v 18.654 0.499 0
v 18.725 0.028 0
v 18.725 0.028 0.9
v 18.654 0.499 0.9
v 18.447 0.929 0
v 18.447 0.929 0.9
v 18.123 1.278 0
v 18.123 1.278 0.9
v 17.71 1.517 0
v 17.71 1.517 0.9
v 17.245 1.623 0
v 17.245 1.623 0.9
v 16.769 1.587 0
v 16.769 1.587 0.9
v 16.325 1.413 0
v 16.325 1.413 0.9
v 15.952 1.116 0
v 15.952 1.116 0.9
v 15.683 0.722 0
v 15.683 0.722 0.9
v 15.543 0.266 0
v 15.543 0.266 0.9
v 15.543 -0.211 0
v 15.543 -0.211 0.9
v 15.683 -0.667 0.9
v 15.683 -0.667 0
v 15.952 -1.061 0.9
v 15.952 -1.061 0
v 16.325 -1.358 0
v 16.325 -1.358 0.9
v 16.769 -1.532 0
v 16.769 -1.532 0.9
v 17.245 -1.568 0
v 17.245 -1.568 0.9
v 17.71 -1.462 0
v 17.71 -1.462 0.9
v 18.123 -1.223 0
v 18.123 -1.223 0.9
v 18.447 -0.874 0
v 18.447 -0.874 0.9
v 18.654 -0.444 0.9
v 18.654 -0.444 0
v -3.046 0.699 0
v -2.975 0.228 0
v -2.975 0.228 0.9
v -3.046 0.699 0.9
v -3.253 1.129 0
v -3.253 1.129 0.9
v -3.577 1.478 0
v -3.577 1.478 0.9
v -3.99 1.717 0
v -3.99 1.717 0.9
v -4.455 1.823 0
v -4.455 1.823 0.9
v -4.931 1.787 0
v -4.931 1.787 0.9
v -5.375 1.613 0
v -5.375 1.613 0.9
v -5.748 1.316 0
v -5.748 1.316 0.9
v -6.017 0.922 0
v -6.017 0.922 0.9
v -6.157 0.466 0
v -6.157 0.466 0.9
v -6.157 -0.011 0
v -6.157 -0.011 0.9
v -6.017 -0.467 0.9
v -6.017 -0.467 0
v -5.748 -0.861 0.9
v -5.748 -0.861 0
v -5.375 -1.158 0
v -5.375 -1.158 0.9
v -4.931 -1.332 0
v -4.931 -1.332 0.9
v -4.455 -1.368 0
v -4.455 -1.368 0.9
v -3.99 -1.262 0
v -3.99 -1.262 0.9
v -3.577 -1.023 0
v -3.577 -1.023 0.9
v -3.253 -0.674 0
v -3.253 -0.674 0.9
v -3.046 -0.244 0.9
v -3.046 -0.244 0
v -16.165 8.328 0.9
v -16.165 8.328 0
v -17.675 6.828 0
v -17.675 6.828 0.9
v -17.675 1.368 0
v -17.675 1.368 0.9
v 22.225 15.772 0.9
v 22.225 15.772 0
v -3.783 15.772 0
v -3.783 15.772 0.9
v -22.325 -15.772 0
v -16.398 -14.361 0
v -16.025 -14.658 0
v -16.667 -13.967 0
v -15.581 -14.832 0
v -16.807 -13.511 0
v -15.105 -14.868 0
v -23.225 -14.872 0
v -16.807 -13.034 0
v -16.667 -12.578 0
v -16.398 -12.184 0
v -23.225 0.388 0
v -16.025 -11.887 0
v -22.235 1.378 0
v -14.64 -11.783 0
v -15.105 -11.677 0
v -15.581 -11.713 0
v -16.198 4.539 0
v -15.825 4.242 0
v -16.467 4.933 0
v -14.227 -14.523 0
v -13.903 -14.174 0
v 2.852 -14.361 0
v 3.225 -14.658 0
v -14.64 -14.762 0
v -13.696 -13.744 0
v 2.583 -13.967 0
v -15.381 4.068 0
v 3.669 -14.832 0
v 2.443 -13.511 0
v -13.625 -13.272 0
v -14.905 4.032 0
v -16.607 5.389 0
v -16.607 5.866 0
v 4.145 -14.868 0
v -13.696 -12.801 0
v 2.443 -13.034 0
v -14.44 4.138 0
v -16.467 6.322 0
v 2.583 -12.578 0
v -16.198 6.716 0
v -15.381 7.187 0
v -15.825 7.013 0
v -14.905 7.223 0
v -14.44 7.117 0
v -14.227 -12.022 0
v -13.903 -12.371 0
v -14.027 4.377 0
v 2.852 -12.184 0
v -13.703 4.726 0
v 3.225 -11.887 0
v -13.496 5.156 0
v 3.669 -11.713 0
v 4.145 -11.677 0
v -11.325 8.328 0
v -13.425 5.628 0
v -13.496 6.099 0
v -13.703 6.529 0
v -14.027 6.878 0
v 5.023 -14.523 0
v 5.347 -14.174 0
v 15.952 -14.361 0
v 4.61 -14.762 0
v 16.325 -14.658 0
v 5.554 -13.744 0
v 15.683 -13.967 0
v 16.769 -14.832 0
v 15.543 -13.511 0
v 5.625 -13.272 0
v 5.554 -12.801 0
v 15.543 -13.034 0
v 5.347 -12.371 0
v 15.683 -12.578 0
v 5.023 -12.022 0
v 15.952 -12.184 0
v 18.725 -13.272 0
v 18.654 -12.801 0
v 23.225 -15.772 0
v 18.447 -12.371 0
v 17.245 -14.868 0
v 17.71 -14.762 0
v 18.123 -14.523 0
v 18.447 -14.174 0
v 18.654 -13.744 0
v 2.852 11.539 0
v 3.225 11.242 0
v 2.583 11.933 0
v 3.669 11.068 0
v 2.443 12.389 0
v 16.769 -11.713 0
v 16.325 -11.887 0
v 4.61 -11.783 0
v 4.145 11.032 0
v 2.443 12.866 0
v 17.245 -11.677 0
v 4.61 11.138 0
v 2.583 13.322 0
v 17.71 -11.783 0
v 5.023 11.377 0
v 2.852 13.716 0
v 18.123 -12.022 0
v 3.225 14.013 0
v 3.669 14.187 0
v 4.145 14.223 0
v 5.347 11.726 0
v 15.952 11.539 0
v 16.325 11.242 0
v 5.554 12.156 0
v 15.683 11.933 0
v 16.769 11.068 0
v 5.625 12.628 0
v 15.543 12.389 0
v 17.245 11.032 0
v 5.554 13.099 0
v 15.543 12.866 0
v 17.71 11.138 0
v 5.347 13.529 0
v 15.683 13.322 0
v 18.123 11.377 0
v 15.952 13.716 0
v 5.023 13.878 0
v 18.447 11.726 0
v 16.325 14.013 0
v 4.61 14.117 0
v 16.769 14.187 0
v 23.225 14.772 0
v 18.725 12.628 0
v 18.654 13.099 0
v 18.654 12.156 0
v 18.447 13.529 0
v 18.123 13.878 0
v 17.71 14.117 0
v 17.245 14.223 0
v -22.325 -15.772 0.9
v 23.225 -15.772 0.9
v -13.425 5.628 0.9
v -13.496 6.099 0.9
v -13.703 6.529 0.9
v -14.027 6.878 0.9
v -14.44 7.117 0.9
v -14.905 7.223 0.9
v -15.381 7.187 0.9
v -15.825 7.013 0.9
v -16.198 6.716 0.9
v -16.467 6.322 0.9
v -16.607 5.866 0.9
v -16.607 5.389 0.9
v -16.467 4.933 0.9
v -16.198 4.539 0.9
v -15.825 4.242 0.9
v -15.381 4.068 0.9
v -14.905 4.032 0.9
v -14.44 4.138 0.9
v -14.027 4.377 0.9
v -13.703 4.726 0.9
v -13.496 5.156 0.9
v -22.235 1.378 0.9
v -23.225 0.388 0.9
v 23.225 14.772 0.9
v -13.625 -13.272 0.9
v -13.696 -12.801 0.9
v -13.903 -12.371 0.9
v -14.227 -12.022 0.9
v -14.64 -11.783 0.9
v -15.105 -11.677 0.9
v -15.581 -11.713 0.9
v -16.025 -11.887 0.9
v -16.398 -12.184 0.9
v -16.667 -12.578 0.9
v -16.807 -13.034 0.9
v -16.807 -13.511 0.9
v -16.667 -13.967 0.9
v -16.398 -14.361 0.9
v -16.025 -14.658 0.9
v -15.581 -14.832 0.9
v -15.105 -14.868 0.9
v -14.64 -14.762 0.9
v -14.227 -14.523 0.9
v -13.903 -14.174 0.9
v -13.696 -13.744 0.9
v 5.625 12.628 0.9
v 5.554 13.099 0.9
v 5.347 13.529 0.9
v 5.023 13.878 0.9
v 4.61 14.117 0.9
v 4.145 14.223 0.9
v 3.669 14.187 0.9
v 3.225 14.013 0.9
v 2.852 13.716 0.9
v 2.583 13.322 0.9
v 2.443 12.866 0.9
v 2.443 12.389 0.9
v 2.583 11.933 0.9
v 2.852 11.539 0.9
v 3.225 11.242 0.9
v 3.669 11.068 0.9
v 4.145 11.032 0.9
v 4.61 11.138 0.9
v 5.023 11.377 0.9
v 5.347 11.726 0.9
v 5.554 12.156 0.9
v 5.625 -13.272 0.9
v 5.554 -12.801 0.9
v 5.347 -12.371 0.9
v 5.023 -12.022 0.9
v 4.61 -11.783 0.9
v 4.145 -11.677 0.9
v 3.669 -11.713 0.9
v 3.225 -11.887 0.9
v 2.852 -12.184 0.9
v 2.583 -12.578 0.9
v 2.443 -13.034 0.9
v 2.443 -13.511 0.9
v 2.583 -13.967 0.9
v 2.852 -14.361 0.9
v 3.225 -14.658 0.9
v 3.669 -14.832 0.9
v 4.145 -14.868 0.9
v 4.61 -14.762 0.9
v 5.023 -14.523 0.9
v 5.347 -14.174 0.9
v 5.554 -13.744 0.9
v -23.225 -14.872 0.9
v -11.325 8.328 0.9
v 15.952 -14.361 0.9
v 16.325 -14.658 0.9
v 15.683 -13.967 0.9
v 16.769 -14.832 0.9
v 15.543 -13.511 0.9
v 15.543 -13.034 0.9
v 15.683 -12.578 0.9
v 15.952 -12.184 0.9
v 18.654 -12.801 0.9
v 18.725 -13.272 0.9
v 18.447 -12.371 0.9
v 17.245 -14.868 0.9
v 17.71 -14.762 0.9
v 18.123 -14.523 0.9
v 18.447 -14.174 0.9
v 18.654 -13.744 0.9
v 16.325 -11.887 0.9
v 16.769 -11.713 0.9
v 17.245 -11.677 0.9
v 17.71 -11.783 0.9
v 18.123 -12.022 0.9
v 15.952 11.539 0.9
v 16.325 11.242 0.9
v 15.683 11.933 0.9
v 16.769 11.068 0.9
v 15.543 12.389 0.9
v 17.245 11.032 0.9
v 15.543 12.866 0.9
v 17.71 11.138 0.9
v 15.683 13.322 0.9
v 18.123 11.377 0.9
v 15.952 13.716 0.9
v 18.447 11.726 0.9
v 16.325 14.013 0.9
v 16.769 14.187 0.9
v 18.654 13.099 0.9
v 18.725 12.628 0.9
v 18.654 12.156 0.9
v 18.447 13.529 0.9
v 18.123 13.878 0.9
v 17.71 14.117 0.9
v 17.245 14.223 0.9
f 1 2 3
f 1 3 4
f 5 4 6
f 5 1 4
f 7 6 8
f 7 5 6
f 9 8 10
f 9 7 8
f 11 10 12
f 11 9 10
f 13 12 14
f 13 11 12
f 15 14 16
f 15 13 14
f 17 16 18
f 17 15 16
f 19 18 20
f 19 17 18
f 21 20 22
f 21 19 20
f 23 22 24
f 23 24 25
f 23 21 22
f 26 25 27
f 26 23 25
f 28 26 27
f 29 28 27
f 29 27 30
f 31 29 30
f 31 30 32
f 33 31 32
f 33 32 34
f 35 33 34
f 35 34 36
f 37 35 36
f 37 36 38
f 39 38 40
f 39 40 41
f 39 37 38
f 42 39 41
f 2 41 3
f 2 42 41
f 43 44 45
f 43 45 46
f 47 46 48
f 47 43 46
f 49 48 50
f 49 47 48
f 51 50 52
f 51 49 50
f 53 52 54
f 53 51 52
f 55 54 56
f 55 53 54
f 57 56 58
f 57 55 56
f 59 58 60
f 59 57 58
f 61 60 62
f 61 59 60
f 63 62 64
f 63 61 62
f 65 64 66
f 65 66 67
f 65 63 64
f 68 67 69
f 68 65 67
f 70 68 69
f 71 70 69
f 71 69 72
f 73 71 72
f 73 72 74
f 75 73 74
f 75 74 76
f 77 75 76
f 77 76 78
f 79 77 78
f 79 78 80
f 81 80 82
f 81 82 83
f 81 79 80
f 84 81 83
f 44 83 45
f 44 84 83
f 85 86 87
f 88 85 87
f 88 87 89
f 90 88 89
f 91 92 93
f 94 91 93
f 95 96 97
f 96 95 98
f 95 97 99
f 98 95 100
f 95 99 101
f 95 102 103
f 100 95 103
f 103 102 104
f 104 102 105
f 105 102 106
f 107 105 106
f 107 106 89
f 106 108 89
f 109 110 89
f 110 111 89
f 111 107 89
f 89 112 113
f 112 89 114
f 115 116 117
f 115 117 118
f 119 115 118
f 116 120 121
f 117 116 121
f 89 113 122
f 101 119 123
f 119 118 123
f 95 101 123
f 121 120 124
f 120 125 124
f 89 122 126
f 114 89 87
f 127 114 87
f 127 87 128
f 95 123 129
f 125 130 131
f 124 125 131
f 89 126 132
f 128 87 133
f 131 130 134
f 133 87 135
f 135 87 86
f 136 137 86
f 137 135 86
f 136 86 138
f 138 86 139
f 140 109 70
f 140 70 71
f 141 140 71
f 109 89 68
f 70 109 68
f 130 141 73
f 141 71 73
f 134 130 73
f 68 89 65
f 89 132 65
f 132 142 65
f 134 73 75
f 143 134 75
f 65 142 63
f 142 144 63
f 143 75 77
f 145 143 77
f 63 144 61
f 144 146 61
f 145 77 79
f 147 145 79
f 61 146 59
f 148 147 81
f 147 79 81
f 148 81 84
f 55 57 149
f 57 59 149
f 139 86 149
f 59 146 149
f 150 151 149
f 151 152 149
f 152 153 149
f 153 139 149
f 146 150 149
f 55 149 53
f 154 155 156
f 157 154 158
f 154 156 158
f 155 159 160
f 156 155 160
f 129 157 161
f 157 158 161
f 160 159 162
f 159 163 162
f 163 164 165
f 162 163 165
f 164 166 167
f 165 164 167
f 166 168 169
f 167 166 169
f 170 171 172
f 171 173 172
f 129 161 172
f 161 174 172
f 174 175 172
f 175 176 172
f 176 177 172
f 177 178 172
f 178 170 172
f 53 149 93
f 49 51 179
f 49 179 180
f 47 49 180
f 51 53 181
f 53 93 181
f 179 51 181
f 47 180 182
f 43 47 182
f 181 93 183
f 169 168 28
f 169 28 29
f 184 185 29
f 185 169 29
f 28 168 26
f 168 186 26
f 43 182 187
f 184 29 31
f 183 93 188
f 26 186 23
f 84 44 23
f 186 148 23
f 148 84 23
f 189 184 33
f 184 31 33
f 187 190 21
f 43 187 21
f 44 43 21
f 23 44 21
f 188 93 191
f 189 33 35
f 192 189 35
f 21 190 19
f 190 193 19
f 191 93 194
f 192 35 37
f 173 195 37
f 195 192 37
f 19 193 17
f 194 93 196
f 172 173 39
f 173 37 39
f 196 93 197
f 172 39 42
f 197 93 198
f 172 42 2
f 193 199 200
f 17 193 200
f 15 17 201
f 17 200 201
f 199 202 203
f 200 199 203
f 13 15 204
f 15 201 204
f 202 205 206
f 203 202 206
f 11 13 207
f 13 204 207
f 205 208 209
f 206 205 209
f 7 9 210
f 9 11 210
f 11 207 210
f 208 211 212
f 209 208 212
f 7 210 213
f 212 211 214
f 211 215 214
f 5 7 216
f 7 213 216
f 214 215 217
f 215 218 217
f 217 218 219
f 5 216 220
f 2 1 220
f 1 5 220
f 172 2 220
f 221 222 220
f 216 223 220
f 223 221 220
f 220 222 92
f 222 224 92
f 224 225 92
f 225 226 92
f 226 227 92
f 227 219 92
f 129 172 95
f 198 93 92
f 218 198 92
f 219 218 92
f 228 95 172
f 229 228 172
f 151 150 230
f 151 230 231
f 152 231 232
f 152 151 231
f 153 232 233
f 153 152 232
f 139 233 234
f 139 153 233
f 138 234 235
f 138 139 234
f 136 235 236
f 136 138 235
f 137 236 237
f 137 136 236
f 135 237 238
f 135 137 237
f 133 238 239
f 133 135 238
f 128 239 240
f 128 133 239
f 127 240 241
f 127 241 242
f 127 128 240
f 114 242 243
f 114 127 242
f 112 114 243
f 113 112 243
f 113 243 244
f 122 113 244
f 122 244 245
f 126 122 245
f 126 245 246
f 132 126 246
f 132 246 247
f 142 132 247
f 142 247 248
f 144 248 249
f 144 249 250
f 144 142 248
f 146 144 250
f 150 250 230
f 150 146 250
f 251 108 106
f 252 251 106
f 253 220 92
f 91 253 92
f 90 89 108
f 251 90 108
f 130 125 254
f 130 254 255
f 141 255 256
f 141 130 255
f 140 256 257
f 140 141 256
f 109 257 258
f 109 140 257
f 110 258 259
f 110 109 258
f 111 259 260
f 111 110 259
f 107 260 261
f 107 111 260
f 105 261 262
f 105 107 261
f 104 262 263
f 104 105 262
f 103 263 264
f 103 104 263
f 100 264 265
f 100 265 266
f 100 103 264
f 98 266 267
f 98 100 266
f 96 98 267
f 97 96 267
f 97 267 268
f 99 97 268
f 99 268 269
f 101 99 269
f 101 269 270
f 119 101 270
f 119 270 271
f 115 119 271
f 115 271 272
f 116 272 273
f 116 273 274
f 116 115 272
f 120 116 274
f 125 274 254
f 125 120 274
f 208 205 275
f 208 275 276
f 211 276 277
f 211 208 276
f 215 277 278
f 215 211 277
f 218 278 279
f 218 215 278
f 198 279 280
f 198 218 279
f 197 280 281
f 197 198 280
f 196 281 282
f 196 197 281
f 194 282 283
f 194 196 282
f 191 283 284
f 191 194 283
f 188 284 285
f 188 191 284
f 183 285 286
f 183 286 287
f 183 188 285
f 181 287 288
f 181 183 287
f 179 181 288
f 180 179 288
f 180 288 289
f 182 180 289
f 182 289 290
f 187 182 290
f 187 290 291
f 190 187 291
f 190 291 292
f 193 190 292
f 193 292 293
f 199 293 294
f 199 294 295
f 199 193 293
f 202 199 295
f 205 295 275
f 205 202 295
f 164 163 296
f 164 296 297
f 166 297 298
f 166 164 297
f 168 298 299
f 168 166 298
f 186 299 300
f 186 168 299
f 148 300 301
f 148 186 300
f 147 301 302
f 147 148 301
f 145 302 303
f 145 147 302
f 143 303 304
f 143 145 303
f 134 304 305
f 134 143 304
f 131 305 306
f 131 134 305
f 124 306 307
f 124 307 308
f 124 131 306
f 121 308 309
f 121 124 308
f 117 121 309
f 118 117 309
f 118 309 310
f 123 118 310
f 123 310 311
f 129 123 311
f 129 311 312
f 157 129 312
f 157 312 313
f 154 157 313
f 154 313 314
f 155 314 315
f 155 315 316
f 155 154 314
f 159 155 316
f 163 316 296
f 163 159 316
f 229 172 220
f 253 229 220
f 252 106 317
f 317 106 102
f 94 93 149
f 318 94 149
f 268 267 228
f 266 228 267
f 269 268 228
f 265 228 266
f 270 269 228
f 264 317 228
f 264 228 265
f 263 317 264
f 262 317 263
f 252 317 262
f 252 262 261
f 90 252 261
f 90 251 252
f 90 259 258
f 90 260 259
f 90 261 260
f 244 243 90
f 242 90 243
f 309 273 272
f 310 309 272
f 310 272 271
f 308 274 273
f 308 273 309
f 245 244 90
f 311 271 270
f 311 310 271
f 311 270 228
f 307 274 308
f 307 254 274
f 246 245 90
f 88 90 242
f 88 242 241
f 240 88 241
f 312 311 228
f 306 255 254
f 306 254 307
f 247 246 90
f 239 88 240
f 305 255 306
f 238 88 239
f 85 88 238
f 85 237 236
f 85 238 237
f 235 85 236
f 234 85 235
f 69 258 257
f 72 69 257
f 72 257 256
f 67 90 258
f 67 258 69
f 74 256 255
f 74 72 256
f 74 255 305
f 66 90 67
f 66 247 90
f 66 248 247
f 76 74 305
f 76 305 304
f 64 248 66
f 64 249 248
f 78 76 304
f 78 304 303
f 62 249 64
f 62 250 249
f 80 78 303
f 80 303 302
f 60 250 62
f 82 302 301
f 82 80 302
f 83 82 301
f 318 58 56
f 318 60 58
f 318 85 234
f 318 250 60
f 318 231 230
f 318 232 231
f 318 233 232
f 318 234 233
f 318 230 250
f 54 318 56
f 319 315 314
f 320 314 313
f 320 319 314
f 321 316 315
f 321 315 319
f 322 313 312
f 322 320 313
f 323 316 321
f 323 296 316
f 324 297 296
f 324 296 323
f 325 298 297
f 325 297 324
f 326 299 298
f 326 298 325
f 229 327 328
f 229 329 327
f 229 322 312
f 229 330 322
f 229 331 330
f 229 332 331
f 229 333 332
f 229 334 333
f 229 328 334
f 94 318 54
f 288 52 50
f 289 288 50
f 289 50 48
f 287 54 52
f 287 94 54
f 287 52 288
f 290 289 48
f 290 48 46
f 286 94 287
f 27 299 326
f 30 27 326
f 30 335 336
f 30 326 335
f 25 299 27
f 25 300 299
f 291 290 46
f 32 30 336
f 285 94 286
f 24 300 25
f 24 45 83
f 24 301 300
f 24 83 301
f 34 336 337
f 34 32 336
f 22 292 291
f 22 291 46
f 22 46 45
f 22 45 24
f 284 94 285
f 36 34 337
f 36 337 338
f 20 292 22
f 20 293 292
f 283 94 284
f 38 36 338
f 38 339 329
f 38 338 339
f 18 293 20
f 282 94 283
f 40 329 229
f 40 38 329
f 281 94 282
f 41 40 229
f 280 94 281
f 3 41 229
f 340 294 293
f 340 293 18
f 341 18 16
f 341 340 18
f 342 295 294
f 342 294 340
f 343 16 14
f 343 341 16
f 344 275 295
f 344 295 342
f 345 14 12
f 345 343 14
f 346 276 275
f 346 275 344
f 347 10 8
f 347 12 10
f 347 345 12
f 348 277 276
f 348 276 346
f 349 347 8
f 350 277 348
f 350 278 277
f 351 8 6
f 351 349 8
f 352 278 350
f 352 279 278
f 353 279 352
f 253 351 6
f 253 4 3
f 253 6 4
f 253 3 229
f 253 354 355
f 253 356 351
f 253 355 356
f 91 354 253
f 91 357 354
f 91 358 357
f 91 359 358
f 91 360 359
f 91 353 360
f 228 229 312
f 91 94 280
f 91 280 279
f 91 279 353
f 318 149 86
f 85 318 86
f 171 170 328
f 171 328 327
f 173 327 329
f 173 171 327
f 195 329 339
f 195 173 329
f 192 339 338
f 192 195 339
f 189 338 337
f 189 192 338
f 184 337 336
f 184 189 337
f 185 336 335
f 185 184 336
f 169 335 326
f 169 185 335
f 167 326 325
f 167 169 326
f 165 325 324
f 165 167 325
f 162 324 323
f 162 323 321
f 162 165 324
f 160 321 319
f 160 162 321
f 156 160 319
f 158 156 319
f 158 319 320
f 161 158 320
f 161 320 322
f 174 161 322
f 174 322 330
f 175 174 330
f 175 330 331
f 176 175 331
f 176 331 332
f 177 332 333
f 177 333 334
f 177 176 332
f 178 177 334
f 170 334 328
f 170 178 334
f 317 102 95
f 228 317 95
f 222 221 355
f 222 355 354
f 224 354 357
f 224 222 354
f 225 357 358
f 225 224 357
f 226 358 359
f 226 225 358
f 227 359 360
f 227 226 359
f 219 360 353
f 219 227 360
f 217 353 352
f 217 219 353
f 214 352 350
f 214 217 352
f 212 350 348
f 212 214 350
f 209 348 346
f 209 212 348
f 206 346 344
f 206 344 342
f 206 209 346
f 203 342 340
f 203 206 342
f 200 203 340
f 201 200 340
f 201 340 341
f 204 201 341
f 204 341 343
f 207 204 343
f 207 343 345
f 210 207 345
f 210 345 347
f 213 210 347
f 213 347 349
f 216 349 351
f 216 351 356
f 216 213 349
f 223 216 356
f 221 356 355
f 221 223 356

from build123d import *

# Parameters (mm, degrees)
F0_R     = 1.6
F1_DEPTH = 0.9


with BuildPart() as f1:
    # F0 (on Top) → F1 (new body)
    with BuildSketch(Plane.XY):
        Polygon((-23.225, -14.8725), (-22.325, -15.7725), (23.225, -15.7725), (23.225, 14.7725), (22.225, 15.7725), (-3.783311, 15.7725), (-11.325, 8.3275), (-16.165, 8.3275), (-17.675, 6.8275), (-17.675, 1.3675), (-22.235, 1.3775), (-23.225, 0.3875), (-23.225, -7.3323), (-23.225, -13.0127), align=None)
        with Locations((-15.225, -13.2725)):
            Circle(F0_R, mode=Mode.SUBTRACT)
        with Locations((4.025, -13.2725)):
            Circle(F0_R, mode=Mode.SUBTRACT)
        with Locations((17.125, -13.2725)):
            Circle(F0_R, mode=Mode.SUBTRACT)
        with Locations((-15.025, 5.627501)):
            Circle(F0_R, mode=Mode.SUBTRACT)
        with Locations((-4.575, 0.2275)):
            Circle(F0_R, mode=Mode.SUBTRACT)
        with Locations((17.125, 0.0275)):
            Circle(F0_R, mode=Mode.SUBTRACT)
        with Locations((4.025, 12.6275)):
            Circle(F0_R, mode=Mode.SUBTRACT)
        with Locations((17.125, 12.6275)):
            Circle(F0_R, mode=Mode.SUBTRACT)
    extrude(amount=F1_DEPTH)


solid = f1.part
